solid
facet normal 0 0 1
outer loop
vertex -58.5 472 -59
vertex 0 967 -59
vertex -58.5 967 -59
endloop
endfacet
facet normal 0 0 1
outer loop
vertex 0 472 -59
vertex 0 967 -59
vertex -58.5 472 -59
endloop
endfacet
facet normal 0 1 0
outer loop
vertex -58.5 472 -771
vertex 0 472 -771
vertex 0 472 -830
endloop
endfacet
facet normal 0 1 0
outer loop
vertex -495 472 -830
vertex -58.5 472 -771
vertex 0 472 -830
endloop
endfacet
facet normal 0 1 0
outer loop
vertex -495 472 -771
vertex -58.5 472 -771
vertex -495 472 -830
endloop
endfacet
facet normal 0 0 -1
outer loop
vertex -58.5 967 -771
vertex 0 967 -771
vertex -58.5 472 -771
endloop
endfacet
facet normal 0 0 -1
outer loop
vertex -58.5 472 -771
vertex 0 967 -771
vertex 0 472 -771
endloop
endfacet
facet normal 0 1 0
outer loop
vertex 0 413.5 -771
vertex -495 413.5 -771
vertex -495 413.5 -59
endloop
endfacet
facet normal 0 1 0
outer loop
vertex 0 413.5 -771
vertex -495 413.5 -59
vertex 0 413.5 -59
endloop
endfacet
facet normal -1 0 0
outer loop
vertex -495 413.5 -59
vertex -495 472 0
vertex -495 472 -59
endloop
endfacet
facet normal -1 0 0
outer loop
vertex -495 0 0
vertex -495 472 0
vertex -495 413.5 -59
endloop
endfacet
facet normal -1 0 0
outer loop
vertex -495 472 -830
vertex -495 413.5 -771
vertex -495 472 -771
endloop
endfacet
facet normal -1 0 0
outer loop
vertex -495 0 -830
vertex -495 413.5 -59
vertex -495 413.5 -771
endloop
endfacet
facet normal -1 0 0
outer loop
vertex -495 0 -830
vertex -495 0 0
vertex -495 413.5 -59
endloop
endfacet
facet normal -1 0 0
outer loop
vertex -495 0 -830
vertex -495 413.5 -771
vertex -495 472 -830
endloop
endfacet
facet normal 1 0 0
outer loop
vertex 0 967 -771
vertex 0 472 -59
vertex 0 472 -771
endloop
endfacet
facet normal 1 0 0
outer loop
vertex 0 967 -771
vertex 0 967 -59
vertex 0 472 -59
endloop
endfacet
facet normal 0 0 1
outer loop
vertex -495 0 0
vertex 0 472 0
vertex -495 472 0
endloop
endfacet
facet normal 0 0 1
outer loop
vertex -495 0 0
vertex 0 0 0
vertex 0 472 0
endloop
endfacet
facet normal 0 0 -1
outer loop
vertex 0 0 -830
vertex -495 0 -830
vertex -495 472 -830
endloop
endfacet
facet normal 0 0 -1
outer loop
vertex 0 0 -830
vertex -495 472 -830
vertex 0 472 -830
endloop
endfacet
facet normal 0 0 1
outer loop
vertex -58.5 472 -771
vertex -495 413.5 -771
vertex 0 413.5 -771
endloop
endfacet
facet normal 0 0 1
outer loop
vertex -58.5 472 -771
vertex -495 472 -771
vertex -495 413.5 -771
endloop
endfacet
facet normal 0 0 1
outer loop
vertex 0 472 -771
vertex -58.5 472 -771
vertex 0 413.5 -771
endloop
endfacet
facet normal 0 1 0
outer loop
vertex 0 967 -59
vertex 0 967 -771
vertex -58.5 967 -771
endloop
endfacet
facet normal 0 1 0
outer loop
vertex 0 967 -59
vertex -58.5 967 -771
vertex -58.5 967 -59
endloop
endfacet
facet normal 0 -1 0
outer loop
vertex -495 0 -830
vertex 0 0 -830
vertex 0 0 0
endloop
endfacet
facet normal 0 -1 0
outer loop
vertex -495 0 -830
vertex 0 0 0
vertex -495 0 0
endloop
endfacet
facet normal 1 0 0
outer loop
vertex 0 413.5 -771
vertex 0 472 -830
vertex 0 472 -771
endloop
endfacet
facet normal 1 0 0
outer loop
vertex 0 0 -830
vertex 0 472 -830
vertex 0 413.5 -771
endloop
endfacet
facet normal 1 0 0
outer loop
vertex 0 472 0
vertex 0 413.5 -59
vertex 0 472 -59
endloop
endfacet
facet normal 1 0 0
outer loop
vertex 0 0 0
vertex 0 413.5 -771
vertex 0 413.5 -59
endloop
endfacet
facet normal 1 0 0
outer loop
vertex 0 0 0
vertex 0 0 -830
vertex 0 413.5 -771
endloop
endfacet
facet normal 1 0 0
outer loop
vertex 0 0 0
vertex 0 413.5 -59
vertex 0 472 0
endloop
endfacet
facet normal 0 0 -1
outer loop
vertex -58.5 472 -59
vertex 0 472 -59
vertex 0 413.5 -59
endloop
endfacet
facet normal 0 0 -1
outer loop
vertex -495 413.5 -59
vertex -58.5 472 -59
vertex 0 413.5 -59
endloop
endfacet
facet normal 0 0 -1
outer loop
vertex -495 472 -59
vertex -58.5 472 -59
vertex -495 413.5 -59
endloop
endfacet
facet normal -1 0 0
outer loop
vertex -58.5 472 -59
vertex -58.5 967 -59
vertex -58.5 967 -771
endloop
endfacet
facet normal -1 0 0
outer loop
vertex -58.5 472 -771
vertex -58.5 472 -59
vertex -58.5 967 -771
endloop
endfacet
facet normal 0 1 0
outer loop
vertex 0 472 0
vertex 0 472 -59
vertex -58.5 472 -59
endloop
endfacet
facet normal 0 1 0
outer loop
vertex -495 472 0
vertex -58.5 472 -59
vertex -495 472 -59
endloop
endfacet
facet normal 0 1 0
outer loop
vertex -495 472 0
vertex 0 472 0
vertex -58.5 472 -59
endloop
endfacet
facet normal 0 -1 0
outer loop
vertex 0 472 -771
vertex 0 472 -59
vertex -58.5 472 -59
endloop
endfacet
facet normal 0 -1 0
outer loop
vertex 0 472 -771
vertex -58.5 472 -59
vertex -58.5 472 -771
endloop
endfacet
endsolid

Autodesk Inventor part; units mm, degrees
ref_plane "YZ Plane" through (0, 0, 0) normal (1, 0, 0) x (0, 1, 0)
ref_plane "XZ Plane" through (0, 0, 0) normal (0, 1, 0) x (-1, 0, 0)
ref_plane "XY Plane" through (0, 0, 0) normal (0, 0, 1) x (1, 0, 0)
sketch "Sketch1" plane through (0, 0, 0) normal (0, 1, 0) x (-1, 0, 0)
  line L0 (0, 0) -> (495, 0)
  line L1 (495, 0) -> (495, -830)
  line L2 (495, -830) -> (0, -830)
  line L3 (0, -830) -> (0, 0)
  dimension "d0" = 495
  dimension "d1" = 830
extrude "Extrusion1" add sketch "Sketch1" along normal blind 472
sketch "Sketch2" plane through (0, 472, 0) normal (0, 1, 0) x (1, 0, 0)
  line L0 (-495, 0) -> (0, 0) projected
  line L1 (0, 0) -> (0, 830) projected
  line L2 (-495, 0) -> (0, 0)
  line L3 (0, 0) -> (0, 59)
  line L4 (0, 59) -> (-495, 59)
  line L5 (-495, 59) -> (-495, 0)
  line L6 (0, 830) -> (-495, 830) projected
  line L7 (0, 830) -> (-495, 830)
  line L8 (-495, 830) -> (-495, 771)
  line L9 (-495, 771) -> (0, 771)
  line L10 (0, 771) -> (0, 830)
  line L11 (-495, 771) -> (0, 771)
  line L12 (0, 771) -> (0, 59)
  line L13 (0, 59) -> (-495, 59)
  line L14 (-495, 59) -> (-495, 771)
  dimension "d4" = 59
  dimension "d5" = 59
extrude "Extrusion2" cut sketch "Sketch2" against normal blind 58.5 contours L14 L9 L1 L4
sketch "Sketch3" plane through (0, 0, 0) normal (1, 0, 0) x (0, 0, -1)
  line L0 (0, 0) -> (0, 472) projected
  line L1 (0, 472) -> (830, 472)
  line L2 (830, 472) -> (830, 967)
  line L3 (830, 967) -> (0, 967)
  line L4 (0, 967) -> (0, 472)
  line L5 (59, 472) -> (59, 413.5) projected
  line L6 (0, 967) -> (59, 967)
  line L7 (59, 967) -> (59, 472)
  line L8 (59, 472) -> (0, 472)
  line L9 (0, 472) -> (0, 967)
  line L10 (771, 472) -> (830, 472)
  line L11 (830, 472) -> (830, 967)
  line L12 (830, 967) -> (771, 967)
  line L13 (771, 967) -> (771, 472)
  line L14 (771, 967) -> (59, 967)
  line L15 (59, 967) -> (59, 472)
  line L16 (59, 472) -> (771, 472)
  line L17 (771, 472) -> (771, 967)
  dimension "d8" = 495
extrude "Extrusion3" add sketch "Sketch3" against normal blind 58.5 contours L7 L3 L13 L1
properties part number "0 - Fridge"
